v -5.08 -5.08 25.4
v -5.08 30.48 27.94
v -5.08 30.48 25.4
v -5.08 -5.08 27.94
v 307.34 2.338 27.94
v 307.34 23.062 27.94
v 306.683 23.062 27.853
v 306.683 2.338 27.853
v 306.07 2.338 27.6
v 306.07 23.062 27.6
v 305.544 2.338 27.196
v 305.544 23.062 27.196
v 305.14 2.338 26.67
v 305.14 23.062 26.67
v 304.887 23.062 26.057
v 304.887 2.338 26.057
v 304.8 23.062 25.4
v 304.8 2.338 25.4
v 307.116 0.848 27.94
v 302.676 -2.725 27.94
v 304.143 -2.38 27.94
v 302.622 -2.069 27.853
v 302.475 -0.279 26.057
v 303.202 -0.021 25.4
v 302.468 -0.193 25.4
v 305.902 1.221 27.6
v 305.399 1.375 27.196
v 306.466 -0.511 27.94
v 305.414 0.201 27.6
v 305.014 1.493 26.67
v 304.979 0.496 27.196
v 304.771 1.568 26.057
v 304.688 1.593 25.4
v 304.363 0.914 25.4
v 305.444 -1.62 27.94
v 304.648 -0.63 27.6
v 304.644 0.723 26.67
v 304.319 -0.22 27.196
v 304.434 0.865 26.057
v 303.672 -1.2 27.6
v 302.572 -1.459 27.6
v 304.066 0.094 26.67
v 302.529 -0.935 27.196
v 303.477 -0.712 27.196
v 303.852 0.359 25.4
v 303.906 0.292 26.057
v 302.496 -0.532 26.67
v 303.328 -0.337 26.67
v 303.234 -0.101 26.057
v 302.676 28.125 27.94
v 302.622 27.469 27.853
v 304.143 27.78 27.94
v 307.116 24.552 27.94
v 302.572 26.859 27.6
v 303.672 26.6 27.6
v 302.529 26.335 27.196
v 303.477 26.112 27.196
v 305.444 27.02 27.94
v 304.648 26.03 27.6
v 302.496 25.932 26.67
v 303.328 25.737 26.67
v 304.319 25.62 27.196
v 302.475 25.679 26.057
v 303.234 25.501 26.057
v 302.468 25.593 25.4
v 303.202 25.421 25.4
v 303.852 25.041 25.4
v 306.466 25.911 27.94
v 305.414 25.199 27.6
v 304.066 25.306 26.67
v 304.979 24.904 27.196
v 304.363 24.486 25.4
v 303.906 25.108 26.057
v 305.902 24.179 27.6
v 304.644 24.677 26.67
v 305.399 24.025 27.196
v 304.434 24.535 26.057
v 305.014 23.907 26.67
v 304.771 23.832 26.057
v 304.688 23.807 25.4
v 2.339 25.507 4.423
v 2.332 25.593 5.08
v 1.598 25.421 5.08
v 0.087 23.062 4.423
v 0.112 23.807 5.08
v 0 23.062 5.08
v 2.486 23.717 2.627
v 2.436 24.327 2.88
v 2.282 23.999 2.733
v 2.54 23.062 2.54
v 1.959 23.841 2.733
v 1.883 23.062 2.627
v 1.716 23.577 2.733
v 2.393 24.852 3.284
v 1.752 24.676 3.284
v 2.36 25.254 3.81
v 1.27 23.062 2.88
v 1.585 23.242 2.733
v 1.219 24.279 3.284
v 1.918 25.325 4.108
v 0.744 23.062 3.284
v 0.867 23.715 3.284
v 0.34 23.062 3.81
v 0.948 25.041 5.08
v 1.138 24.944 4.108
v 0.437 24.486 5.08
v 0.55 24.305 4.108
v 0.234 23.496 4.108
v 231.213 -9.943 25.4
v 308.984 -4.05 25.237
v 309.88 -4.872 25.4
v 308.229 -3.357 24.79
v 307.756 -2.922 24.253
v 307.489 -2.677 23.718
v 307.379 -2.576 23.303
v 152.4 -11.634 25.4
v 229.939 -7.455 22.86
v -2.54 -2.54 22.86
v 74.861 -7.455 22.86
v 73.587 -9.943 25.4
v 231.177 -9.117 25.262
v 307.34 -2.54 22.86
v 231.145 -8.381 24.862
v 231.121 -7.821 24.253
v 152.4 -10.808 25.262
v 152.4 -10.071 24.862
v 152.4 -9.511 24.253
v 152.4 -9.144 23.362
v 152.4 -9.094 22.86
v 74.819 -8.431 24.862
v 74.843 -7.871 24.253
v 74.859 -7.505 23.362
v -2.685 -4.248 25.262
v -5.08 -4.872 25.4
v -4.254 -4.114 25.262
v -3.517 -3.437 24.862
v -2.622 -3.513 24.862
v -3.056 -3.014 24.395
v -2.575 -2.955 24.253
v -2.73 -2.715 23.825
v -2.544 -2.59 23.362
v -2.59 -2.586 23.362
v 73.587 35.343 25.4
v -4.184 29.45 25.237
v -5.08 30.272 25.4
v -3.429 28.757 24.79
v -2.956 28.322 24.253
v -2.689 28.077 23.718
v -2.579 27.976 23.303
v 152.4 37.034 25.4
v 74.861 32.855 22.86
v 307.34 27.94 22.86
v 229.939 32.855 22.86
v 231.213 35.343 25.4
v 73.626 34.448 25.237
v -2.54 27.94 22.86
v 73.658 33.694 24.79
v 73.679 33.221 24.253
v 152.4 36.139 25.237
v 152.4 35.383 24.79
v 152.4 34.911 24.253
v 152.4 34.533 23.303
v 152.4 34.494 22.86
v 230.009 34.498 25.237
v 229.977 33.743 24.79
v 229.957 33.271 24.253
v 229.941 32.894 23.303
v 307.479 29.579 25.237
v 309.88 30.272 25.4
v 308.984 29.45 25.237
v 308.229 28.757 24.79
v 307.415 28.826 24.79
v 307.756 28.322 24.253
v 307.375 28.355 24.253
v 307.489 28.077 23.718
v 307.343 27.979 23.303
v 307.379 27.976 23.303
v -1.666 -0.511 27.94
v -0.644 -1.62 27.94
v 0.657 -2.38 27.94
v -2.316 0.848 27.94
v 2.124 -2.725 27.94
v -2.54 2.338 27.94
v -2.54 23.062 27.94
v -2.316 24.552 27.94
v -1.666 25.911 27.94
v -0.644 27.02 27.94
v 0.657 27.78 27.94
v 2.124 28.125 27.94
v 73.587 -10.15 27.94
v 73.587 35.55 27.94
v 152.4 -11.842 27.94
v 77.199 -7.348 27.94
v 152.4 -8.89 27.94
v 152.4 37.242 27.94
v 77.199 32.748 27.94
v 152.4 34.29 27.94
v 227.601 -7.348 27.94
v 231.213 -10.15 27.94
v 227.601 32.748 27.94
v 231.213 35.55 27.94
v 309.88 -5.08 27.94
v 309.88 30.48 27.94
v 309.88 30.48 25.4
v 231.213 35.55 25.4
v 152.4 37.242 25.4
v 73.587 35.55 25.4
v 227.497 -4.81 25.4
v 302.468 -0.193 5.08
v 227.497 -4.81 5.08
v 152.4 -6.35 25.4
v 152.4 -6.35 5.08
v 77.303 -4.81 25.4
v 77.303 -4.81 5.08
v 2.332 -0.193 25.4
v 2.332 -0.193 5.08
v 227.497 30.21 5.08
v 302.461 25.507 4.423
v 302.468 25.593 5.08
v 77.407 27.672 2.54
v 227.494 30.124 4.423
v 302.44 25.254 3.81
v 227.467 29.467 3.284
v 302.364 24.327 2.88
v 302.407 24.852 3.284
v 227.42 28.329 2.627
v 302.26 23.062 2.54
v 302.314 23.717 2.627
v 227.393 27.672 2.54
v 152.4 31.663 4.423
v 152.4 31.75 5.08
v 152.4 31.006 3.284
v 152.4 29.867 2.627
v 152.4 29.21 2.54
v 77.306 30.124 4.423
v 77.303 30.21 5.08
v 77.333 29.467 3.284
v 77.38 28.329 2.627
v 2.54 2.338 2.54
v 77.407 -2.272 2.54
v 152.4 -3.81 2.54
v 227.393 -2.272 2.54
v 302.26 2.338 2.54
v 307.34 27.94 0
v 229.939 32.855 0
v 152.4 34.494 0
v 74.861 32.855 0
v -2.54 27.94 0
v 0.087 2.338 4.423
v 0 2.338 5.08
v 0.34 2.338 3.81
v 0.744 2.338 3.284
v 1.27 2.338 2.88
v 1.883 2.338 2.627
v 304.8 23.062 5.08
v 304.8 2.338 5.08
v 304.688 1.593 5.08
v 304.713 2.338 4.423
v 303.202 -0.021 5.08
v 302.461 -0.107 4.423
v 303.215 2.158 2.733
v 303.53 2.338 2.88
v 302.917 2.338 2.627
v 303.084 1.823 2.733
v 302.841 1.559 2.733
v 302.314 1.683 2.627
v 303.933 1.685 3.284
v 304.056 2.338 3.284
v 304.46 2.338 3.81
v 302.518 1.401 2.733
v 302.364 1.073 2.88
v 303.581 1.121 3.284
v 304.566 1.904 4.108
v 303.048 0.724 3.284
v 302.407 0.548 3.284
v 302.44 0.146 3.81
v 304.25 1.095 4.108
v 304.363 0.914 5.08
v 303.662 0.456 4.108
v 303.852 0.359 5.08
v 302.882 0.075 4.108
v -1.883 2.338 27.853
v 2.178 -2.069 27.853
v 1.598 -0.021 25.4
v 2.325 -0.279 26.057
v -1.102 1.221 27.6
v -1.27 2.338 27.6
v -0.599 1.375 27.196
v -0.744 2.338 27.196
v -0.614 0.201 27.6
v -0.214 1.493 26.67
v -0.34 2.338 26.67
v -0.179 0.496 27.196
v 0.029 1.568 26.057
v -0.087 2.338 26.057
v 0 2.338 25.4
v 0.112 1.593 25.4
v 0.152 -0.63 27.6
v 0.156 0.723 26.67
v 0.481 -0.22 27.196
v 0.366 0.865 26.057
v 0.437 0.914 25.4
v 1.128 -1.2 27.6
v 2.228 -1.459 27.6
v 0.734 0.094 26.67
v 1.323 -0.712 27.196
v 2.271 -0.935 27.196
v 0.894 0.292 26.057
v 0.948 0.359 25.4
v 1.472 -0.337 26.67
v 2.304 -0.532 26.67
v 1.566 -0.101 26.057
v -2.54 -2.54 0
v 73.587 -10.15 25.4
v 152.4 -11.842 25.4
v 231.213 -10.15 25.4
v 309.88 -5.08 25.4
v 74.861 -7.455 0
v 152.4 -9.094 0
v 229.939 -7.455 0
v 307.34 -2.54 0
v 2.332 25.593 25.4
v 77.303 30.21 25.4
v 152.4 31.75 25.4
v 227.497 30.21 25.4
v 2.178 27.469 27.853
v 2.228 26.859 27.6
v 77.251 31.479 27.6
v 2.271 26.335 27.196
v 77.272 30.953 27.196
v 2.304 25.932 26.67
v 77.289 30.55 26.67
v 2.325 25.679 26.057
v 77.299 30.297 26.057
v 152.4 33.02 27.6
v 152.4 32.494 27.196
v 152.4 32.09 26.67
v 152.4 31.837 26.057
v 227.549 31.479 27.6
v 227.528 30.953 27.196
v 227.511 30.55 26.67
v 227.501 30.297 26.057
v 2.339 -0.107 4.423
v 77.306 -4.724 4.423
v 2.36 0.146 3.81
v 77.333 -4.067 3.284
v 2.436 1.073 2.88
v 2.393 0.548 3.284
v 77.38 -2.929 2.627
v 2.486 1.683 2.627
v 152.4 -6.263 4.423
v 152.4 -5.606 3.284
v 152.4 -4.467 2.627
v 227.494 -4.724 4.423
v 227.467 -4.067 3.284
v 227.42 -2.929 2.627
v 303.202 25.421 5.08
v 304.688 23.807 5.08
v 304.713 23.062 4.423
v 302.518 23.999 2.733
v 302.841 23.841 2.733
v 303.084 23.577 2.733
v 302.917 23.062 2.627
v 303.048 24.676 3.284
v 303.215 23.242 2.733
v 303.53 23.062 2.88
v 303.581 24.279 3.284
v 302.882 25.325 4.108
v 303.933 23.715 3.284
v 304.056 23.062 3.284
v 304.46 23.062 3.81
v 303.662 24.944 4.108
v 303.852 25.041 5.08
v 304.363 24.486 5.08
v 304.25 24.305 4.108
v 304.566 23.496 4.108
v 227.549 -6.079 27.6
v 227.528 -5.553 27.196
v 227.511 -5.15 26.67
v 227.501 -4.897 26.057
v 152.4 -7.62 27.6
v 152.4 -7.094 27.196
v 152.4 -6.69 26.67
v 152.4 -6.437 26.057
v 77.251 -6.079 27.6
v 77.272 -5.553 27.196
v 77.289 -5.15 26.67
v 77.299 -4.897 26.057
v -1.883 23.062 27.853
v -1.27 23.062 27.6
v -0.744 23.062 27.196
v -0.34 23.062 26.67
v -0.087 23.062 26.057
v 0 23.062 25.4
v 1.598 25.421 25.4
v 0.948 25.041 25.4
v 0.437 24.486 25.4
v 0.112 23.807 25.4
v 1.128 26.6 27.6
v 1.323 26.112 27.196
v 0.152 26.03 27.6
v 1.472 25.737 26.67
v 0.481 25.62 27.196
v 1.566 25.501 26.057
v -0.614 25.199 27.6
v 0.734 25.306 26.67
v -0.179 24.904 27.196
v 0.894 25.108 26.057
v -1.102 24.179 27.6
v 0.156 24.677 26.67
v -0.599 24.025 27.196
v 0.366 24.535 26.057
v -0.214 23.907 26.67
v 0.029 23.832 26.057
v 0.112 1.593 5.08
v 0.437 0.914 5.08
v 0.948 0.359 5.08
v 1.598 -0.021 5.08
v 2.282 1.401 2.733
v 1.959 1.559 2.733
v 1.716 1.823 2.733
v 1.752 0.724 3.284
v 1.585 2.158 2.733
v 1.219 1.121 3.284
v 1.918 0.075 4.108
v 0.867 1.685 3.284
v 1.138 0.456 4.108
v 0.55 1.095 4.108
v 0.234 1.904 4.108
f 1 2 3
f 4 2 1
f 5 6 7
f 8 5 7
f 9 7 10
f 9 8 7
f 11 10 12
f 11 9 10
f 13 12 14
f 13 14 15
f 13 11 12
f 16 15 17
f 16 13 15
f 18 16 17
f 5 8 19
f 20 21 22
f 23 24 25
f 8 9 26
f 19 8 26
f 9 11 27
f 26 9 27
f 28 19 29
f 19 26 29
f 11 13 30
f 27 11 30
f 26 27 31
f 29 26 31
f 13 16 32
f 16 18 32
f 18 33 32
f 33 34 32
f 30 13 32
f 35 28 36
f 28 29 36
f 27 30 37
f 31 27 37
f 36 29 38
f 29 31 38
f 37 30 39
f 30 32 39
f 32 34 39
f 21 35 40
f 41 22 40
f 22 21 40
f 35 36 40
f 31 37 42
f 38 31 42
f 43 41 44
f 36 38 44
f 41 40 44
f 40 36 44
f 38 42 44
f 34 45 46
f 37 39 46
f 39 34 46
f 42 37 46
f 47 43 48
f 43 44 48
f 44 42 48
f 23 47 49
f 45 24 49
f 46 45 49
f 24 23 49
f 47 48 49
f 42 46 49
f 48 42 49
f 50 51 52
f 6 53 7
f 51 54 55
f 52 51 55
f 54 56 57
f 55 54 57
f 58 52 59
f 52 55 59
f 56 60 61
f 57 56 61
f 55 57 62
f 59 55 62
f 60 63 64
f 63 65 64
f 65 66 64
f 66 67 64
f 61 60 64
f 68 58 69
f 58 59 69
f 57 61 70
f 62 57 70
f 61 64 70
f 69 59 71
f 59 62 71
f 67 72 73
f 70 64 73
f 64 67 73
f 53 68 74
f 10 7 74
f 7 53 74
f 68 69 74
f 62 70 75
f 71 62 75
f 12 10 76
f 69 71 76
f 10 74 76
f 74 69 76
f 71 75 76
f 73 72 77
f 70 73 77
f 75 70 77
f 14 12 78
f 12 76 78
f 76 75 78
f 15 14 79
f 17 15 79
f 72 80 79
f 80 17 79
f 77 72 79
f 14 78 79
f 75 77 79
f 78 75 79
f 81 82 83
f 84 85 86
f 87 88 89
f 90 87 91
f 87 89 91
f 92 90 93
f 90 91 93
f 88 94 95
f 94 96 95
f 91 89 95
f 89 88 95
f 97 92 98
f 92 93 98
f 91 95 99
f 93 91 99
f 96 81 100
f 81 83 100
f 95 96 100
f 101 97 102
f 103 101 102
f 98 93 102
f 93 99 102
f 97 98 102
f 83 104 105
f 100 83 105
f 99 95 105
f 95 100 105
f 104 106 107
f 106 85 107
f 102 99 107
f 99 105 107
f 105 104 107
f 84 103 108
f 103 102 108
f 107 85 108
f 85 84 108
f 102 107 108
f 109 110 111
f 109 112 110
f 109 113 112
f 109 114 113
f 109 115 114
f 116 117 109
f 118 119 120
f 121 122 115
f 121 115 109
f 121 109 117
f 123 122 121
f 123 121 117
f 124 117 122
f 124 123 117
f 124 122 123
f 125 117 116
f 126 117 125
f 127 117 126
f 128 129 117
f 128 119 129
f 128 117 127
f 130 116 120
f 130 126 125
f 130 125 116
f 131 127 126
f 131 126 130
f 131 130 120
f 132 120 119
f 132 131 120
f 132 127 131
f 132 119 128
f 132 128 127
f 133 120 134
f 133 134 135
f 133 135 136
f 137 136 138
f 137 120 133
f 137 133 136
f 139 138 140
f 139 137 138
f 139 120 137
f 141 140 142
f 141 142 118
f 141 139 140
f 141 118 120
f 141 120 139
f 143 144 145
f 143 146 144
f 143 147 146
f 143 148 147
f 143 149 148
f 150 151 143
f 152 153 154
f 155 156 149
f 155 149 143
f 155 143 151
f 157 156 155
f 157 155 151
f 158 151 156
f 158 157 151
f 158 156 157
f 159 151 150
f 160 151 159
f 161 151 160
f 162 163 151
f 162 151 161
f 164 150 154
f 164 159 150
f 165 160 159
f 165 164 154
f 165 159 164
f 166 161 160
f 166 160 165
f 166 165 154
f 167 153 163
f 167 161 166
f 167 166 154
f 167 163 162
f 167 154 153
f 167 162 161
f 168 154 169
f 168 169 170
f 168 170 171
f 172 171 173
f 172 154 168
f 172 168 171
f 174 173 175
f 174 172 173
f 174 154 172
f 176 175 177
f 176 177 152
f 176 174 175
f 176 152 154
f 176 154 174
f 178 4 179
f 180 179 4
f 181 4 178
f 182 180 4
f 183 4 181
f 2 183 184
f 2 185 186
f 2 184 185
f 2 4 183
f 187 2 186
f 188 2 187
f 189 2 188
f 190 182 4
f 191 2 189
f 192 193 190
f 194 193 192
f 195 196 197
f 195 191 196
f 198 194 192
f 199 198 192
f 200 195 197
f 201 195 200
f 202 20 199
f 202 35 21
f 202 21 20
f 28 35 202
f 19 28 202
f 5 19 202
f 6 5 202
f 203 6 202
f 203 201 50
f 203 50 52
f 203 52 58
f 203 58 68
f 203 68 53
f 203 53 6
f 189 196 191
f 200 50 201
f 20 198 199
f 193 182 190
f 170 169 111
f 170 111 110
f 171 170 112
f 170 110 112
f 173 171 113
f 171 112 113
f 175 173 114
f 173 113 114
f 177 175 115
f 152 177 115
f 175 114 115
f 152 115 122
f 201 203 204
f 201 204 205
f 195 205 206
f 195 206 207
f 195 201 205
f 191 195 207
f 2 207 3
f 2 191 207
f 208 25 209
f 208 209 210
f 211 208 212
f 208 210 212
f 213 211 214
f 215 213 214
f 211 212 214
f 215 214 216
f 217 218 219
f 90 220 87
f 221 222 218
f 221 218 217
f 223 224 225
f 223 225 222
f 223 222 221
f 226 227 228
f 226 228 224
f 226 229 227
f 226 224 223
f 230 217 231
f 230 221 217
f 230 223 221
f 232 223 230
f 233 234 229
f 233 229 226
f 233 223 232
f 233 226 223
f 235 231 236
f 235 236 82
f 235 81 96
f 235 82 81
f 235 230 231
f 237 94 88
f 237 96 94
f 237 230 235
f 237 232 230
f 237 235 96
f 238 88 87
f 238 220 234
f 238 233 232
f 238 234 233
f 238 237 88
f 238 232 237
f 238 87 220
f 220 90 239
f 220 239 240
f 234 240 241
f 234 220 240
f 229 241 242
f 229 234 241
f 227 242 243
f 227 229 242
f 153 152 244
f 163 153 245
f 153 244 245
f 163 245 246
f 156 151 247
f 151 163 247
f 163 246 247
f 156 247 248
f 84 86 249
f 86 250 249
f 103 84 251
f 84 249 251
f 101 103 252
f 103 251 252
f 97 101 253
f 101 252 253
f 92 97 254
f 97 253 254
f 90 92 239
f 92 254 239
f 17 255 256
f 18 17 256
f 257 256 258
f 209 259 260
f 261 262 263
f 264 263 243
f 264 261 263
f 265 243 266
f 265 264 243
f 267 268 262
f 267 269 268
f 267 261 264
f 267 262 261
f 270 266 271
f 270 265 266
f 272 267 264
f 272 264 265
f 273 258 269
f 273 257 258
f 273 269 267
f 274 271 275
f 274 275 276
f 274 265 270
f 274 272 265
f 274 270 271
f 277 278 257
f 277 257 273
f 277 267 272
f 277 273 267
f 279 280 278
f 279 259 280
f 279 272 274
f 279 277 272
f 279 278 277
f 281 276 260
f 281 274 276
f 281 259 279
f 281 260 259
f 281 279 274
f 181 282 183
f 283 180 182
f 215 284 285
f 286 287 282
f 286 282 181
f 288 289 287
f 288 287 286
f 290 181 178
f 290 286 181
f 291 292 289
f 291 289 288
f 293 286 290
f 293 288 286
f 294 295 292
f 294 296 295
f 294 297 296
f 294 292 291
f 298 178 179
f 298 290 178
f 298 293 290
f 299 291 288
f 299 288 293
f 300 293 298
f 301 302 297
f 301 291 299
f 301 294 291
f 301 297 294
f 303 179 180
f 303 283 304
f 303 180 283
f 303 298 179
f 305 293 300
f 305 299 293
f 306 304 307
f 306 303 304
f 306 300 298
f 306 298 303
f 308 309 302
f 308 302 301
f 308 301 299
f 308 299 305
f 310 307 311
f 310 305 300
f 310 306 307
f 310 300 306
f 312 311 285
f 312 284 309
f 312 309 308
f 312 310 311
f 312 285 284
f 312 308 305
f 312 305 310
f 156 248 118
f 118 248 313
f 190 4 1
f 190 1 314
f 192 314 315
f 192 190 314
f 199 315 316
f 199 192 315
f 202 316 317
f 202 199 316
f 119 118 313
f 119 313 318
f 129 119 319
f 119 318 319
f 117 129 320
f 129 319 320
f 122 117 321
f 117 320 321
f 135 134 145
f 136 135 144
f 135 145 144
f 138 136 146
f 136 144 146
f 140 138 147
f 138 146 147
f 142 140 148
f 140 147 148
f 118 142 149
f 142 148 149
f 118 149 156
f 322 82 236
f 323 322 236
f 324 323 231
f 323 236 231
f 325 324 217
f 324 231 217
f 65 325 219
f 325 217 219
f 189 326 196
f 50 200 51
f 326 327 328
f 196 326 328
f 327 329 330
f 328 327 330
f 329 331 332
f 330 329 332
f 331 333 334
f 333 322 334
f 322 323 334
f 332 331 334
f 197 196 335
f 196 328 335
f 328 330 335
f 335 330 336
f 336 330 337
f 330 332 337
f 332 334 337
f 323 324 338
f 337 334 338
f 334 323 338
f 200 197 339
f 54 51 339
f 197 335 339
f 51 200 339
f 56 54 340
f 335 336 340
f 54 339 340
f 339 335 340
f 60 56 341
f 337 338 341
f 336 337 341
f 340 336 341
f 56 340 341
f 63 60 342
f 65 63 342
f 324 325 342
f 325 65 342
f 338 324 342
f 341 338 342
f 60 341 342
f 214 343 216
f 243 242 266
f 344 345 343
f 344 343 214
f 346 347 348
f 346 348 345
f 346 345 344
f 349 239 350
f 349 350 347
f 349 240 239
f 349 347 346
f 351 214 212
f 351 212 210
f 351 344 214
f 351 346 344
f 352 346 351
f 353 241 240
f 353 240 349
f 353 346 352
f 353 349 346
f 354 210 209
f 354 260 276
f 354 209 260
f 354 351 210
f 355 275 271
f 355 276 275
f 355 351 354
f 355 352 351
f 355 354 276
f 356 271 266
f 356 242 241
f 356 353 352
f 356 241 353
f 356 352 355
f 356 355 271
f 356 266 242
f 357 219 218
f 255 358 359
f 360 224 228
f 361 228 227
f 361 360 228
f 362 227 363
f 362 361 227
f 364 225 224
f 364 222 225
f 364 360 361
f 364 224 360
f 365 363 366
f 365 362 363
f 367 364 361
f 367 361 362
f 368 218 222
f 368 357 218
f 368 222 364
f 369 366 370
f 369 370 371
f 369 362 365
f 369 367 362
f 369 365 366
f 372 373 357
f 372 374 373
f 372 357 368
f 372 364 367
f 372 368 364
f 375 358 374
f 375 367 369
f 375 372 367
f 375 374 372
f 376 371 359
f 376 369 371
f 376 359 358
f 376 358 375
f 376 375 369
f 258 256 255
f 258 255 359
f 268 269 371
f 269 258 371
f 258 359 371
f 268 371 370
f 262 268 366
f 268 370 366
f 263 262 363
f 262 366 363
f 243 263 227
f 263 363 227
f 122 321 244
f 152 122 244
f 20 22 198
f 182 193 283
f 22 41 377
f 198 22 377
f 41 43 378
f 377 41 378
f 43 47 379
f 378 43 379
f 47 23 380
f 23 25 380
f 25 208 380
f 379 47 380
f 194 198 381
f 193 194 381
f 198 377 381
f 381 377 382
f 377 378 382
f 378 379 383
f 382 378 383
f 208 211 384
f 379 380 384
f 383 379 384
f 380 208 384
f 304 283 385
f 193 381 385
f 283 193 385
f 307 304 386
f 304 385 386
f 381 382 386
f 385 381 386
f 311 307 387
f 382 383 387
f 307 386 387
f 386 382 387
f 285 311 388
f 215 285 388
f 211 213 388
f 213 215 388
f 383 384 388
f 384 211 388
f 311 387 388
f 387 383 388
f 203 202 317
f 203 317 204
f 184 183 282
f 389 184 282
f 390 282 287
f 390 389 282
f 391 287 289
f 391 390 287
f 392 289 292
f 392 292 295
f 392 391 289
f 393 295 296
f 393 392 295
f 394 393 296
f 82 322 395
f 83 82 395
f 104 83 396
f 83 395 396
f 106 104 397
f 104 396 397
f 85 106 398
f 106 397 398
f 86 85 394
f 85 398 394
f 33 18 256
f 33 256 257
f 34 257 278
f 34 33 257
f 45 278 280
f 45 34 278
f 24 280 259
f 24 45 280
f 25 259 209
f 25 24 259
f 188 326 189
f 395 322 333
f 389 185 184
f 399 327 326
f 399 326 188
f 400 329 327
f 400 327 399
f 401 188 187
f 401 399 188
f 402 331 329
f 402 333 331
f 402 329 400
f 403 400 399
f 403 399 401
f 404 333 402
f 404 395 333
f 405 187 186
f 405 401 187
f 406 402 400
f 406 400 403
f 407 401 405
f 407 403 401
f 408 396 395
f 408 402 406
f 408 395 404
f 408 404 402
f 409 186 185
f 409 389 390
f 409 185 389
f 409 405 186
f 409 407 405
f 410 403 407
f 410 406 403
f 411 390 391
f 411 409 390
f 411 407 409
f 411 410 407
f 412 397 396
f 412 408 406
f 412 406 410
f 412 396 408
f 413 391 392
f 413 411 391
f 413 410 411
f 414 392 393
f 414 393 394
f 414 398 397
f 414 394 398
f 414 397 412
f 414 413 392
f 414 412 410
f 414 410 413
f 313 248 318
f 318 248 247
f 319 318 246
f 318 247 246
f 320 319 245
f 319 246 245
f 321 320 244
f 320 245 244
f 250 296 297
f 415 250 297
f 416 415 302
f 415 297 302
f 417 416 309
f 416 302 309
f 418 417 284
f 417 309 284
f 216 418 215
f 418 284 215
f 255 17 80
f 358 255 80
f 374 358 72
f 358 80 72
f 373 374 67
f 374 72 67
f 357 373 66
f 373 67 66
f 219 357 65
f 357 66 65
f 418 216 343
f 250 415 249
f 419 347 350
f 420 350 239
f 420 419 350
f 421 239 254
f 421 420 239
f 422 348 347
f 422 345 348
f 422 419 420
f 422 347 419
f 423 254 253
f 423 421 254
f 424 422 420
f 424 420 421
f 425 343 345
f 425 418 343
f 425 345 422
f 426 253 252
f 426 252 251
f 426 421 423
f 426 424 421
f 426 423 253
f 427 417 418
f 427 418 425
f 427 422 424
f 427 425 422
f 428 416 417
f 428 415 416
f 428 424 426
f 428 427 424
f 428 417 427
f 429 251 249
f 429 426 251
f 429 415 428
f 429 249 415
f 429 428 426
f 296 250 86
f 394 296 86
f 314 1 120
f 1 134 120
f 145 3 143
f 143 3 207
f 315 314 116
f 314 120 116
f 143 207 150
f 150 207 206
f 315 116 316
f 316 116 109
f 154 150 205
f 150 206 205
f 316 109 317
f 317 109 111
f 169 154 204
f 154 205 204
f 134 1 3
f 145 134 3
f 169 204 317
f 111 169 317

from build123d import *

# Parameters (mm, degrees)
F1_DEPTH = 2.54
F2_DEPTH = 27.94
F4_DEPTH = 2.54
F5_R     = 2.53999


# Not quite as in the source:
# - a fillet or chamfer is up to 0.001 mm smaller than in the source, because OpenCascade refuses the exact size


with BuildPart() as f1:
    # F0 (on Top) → F1 (new body)
    with BuildSketch(Plane.XY):
        with BuildLine():
            Line((0, 25.4), (0, 0))
            ThreePointArc((0, 0), (152.4, -6.35), (304.8, 0))
            Line((304.8, 0), (304.8, 25.4))
            ThreePointArc((304.8, 25.4), (152.4, 31.75), (0, 25.4))
        make_face()
    extrude(amount=F1_DEPTH)

    # F0 (on Top) → F2 (join)
    with BuildSketch(Plane.XY):
        with BuildLine():
            Line((-2.54, 27.94), (-2.54, -2.54))
            ThreePointArc((-2.54, -2.54), (152.4, -9.0943273232), (307.34, -2.54))
            Line((307.34, -2.54), (307.34, 27.94))
            ThreePointArc((307.34, 27.94), (152.4, 34.4943273232), (-2.54, 27.94))
        make_face()
        with BuildLine():
            ThreePointArc((304.8, 0), (152.4, -6.35), (0, 0))
            Line((0, 0), (0, 25.4))
            ThreePointArc((0, 25.4), (152.4, 31.75), (304.8, 25.4))
            Line((304.8, 25.4), (304.8, 0))
        make_face(mode=Mode.SUBTRACT)
    extrude(amount=F2_DEPTH)

    # F3 (on face) → F4 (join)
    with BuildSketch(Plane.XY.offset(27.94)):
        with BuildLine():
            ThreePointArc((309.88, 30.48), (152.4, 37.2416066482), (-5.08, 30.48))
            Line((-5.08, 30.48), (-5.08, -5.08))
            ThreePointArc((-5.08, -5.08), (152.4, -11.8416066482), (309.88, -5.08))
            Line((309.88, -5.08), (309.88, 30.48))
        make_face()
        with BuildLine():
            ThreePointArc((-2.54, 27.94), (152.4, 34.4943273232), (307.34, 27.94))
            Line((307.34, 27.94), (307.34, -2.54))
            ThreePointArc((307.34, -2.54), (152.4, -9.0943273232), (-2.54, -2.54))
            Line((-2.54, -2.54), (-2.54, 27.94))
        make_face(mode=Mode.SUBTRACT)
    extrude(amount=-F4_DEPTH)

    # F5 (radius 2.54 in the source; OpenCascade refuses exactly that, so slightly less here)
    f5_edges = [f1.edges().sort_by_distance(p)[0] for p in [
        (152.4, -9.094327, 25.4),
        (307.34, 12.7, 25.4),
        (152.4, 34.494327, 25.4),
        (-2.54, 12.7, 25.4),
        (0, 25.4, 15.24),
        (152.4, 31.75, 2.54),
        (0, 12.7, 2.54),
        (0, 0, 15.24),
        (304.8, 12.7, 2.54),
        (152.4, -6.35, 2.54),
        (304.8, 25.4, 15.24),
        (304.8, 0, 15.24),
        (152.4, 31.75, 27.94),
        (0, 12.7, 27.94),
        (304.8, 12.7, 27.94),
        (152.4, -6.35, 27.94),
    ]]
    fillet(f5_edges, radius=F5_R)


solid = f1.part
